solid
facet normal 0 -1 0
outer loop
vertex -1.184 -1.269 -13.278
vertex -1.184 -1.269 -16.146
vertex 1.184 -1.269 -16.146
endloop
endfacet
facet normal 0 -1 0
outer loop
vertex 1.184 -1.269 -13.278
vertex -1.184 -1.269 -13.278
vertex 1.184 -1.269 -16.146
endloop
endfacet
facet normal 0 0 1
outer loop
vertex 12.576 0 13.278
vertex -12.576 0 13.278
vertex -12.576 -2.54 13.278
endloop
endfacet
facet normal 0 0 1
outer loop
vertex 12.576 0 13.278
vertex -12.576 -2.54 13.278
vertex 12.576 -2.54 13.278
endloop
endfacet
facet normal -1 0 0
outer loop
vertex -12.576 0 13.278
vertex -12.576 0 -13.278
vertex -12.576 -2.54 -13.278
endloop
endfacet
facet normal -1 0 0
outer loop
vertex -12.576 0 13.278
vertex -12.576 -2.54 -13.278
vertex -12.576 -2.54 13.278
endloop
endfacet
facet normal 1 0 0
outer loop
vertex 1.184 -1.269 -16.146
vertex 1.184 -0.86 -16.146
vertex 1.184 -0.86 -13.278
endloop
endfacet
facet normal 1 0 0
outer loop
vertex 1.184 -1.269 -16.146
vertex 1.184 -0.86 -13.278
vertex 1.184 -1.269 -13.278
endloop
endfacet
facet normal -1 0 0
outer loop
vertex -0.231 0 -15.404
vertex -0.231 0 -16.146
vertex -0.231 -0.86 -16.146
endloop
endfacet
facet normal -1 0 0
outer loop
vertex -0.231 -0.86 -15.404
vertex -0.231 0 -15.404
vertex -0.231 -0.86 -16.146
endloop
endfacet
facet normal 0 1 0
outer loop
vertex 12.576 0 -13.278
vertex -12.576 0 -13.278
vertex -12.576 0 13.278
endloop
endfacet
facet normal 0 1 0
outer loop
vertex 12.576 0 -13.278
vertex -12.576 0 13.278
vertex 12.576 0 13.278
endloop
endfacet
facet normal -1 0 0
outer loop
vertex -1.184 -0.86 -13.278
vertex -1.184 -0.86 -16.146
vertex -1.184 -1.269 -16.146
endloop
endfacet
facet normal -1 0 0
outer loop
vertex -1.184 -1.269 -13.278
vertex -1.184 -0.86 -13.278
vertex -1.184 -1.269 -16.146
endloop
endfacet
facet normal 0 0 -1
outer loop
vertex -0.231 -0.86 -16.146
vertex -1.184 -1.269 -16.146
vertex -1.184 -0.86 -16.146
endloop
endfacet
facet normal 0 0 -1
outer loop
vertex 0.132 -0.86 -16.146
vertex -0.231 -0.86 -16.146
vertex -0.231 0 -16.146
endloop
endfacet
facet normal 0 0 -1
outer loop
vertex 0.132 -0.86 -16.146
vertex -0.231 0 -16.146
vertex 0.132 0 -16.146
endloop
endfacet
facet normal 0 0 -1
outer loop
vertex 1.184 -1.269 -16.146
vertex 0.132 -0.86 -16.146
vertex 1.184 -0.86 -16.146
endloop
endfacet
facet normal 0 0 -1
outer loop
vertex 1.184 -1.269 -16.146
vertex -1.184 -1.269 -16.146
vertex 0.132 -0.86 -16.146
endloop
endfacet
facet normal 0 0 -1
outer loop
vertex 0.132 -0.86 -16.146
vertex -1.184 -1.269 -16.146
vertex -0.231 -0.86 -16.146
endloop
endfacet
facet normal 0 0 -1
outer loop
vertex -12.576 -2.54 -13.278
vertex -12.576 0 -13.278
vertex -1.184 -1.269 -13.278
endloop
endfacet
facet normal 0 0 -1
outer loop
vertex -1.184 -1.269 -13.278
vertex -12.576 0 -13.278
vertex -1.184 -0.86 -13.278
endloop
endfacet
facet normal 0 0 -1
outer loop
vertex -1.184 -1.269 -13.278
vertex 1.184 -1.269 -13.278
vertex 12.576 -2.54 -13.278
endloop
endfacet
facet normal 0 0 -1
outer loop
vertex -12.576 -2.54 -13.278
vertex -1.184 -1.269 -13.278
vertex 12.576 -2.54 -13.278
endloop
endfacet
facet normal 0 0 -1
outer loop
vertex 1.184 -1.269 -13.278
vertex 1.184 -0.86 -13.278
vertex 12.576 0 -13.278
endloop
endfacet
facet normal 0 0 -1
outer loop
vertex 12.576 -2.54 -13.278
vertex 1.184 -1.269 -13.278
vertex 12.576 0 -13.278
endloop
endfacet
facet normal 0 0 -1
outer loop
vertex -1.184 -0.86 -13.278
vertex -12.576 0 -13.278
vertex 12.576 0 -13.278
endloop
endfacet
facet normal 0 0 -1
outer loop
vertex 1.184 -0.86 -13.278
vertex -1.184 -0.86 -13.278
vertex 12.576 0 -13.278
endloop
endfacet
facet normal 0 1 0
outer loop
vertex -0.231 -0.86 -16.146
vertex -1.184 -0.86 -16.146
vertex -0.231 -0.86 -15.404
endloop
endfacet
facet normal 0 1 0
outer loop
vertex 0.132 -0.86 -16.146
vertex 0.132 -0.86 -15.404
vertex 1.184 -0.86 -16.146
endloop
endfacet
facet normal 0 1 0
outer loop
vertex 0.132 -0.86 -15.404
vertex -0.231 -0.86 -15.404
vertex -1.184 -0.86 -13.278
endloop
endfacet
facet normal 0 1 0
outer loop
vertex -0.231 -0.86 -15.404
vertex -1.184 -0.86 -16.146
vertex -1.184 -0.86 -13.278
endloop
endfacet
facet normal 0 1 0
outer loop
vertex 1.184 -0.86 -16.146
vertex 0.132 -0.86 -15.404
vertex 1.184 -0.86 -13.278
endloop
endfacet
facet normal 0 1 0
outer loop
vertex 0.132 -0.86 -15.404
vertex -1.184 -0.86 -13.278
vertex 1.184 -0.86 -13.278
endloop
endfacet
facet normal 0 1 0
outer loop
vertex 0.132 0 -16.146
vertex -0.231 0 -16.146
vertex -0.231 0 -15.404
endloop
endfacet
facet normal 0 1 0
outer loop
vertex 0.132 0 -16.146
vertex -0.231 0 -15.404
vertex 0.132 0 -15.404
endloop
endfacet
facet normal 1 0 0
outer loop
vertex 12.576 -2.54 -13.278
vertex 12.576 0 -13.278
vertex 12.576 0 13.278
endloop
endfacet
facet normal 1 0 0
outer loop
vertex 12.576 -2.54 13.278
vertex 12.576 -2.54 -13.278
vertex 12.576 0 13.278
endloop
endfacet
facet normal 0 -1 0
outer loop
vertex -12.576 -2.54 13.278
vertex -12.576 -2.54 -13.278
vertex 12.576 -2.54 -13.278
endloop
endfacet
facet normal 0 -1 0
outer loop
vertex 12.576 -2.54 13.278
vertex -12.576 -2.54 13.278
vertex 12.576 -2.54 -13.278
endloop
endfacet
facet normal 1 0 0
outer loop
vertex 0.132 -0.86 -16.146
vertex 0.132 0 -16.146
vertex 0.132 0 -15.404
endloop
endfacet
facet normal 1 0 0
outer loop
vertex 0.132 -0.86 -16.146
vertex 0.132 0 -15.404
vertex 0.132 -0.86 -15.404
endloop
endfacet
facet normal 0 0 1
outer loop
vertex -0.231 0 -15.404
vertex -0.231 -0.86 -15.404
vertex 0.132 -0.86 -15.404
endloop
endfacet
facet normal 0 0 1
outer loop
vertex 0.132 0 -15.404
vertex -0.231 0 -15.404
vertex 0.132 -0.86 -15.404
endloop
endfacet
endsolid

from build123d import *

# Parameters (mm, degrees)
F0_W     = 25.1511335373
F0_H     = 26.5552401543
F1_DEPTH = 2.54
F2_W     = 2.3688124493
F2_H     = 0.4084529355
F3_DEPTH = 2.8681720141
F4_W     = 0.3632875159
F4_H     = 0.8602547459
F5_DEPTH = 0.7417961024


with BuildPart() as f1:
    # F0 (on Front) → F1 (new body)
    with BuildSketch(Plane.XZ):
        Rectangle(F0_W, F0_H)
    extrude(amount=F1_DEPTH)

    # F2 (on face) → F3 (join)
    with BuildSketch(Plane(origin=(0, 0, -13.2776200771), x_dir=(1, 0, 0), z_dir=(0, 0, -1))):
        with Locations((0, 1.0644812137)):
            Rectangle(F2_W, F2_H)
    extrude(amount=F3_DEPTH)

    # F4 (on face) → F5 (join)
    with BuildSketch(Plane(origin=(0, 0, -16.1457920913), x_dir=(1, 0, 0), z_dir=(0, 0, -1))):
        with Locations((-0.0494890846, 0.430127373)):
            Rectangle(F4_W, F4_H)
    extrude(amount=-F5_DEPTH)


solid = f1.part
